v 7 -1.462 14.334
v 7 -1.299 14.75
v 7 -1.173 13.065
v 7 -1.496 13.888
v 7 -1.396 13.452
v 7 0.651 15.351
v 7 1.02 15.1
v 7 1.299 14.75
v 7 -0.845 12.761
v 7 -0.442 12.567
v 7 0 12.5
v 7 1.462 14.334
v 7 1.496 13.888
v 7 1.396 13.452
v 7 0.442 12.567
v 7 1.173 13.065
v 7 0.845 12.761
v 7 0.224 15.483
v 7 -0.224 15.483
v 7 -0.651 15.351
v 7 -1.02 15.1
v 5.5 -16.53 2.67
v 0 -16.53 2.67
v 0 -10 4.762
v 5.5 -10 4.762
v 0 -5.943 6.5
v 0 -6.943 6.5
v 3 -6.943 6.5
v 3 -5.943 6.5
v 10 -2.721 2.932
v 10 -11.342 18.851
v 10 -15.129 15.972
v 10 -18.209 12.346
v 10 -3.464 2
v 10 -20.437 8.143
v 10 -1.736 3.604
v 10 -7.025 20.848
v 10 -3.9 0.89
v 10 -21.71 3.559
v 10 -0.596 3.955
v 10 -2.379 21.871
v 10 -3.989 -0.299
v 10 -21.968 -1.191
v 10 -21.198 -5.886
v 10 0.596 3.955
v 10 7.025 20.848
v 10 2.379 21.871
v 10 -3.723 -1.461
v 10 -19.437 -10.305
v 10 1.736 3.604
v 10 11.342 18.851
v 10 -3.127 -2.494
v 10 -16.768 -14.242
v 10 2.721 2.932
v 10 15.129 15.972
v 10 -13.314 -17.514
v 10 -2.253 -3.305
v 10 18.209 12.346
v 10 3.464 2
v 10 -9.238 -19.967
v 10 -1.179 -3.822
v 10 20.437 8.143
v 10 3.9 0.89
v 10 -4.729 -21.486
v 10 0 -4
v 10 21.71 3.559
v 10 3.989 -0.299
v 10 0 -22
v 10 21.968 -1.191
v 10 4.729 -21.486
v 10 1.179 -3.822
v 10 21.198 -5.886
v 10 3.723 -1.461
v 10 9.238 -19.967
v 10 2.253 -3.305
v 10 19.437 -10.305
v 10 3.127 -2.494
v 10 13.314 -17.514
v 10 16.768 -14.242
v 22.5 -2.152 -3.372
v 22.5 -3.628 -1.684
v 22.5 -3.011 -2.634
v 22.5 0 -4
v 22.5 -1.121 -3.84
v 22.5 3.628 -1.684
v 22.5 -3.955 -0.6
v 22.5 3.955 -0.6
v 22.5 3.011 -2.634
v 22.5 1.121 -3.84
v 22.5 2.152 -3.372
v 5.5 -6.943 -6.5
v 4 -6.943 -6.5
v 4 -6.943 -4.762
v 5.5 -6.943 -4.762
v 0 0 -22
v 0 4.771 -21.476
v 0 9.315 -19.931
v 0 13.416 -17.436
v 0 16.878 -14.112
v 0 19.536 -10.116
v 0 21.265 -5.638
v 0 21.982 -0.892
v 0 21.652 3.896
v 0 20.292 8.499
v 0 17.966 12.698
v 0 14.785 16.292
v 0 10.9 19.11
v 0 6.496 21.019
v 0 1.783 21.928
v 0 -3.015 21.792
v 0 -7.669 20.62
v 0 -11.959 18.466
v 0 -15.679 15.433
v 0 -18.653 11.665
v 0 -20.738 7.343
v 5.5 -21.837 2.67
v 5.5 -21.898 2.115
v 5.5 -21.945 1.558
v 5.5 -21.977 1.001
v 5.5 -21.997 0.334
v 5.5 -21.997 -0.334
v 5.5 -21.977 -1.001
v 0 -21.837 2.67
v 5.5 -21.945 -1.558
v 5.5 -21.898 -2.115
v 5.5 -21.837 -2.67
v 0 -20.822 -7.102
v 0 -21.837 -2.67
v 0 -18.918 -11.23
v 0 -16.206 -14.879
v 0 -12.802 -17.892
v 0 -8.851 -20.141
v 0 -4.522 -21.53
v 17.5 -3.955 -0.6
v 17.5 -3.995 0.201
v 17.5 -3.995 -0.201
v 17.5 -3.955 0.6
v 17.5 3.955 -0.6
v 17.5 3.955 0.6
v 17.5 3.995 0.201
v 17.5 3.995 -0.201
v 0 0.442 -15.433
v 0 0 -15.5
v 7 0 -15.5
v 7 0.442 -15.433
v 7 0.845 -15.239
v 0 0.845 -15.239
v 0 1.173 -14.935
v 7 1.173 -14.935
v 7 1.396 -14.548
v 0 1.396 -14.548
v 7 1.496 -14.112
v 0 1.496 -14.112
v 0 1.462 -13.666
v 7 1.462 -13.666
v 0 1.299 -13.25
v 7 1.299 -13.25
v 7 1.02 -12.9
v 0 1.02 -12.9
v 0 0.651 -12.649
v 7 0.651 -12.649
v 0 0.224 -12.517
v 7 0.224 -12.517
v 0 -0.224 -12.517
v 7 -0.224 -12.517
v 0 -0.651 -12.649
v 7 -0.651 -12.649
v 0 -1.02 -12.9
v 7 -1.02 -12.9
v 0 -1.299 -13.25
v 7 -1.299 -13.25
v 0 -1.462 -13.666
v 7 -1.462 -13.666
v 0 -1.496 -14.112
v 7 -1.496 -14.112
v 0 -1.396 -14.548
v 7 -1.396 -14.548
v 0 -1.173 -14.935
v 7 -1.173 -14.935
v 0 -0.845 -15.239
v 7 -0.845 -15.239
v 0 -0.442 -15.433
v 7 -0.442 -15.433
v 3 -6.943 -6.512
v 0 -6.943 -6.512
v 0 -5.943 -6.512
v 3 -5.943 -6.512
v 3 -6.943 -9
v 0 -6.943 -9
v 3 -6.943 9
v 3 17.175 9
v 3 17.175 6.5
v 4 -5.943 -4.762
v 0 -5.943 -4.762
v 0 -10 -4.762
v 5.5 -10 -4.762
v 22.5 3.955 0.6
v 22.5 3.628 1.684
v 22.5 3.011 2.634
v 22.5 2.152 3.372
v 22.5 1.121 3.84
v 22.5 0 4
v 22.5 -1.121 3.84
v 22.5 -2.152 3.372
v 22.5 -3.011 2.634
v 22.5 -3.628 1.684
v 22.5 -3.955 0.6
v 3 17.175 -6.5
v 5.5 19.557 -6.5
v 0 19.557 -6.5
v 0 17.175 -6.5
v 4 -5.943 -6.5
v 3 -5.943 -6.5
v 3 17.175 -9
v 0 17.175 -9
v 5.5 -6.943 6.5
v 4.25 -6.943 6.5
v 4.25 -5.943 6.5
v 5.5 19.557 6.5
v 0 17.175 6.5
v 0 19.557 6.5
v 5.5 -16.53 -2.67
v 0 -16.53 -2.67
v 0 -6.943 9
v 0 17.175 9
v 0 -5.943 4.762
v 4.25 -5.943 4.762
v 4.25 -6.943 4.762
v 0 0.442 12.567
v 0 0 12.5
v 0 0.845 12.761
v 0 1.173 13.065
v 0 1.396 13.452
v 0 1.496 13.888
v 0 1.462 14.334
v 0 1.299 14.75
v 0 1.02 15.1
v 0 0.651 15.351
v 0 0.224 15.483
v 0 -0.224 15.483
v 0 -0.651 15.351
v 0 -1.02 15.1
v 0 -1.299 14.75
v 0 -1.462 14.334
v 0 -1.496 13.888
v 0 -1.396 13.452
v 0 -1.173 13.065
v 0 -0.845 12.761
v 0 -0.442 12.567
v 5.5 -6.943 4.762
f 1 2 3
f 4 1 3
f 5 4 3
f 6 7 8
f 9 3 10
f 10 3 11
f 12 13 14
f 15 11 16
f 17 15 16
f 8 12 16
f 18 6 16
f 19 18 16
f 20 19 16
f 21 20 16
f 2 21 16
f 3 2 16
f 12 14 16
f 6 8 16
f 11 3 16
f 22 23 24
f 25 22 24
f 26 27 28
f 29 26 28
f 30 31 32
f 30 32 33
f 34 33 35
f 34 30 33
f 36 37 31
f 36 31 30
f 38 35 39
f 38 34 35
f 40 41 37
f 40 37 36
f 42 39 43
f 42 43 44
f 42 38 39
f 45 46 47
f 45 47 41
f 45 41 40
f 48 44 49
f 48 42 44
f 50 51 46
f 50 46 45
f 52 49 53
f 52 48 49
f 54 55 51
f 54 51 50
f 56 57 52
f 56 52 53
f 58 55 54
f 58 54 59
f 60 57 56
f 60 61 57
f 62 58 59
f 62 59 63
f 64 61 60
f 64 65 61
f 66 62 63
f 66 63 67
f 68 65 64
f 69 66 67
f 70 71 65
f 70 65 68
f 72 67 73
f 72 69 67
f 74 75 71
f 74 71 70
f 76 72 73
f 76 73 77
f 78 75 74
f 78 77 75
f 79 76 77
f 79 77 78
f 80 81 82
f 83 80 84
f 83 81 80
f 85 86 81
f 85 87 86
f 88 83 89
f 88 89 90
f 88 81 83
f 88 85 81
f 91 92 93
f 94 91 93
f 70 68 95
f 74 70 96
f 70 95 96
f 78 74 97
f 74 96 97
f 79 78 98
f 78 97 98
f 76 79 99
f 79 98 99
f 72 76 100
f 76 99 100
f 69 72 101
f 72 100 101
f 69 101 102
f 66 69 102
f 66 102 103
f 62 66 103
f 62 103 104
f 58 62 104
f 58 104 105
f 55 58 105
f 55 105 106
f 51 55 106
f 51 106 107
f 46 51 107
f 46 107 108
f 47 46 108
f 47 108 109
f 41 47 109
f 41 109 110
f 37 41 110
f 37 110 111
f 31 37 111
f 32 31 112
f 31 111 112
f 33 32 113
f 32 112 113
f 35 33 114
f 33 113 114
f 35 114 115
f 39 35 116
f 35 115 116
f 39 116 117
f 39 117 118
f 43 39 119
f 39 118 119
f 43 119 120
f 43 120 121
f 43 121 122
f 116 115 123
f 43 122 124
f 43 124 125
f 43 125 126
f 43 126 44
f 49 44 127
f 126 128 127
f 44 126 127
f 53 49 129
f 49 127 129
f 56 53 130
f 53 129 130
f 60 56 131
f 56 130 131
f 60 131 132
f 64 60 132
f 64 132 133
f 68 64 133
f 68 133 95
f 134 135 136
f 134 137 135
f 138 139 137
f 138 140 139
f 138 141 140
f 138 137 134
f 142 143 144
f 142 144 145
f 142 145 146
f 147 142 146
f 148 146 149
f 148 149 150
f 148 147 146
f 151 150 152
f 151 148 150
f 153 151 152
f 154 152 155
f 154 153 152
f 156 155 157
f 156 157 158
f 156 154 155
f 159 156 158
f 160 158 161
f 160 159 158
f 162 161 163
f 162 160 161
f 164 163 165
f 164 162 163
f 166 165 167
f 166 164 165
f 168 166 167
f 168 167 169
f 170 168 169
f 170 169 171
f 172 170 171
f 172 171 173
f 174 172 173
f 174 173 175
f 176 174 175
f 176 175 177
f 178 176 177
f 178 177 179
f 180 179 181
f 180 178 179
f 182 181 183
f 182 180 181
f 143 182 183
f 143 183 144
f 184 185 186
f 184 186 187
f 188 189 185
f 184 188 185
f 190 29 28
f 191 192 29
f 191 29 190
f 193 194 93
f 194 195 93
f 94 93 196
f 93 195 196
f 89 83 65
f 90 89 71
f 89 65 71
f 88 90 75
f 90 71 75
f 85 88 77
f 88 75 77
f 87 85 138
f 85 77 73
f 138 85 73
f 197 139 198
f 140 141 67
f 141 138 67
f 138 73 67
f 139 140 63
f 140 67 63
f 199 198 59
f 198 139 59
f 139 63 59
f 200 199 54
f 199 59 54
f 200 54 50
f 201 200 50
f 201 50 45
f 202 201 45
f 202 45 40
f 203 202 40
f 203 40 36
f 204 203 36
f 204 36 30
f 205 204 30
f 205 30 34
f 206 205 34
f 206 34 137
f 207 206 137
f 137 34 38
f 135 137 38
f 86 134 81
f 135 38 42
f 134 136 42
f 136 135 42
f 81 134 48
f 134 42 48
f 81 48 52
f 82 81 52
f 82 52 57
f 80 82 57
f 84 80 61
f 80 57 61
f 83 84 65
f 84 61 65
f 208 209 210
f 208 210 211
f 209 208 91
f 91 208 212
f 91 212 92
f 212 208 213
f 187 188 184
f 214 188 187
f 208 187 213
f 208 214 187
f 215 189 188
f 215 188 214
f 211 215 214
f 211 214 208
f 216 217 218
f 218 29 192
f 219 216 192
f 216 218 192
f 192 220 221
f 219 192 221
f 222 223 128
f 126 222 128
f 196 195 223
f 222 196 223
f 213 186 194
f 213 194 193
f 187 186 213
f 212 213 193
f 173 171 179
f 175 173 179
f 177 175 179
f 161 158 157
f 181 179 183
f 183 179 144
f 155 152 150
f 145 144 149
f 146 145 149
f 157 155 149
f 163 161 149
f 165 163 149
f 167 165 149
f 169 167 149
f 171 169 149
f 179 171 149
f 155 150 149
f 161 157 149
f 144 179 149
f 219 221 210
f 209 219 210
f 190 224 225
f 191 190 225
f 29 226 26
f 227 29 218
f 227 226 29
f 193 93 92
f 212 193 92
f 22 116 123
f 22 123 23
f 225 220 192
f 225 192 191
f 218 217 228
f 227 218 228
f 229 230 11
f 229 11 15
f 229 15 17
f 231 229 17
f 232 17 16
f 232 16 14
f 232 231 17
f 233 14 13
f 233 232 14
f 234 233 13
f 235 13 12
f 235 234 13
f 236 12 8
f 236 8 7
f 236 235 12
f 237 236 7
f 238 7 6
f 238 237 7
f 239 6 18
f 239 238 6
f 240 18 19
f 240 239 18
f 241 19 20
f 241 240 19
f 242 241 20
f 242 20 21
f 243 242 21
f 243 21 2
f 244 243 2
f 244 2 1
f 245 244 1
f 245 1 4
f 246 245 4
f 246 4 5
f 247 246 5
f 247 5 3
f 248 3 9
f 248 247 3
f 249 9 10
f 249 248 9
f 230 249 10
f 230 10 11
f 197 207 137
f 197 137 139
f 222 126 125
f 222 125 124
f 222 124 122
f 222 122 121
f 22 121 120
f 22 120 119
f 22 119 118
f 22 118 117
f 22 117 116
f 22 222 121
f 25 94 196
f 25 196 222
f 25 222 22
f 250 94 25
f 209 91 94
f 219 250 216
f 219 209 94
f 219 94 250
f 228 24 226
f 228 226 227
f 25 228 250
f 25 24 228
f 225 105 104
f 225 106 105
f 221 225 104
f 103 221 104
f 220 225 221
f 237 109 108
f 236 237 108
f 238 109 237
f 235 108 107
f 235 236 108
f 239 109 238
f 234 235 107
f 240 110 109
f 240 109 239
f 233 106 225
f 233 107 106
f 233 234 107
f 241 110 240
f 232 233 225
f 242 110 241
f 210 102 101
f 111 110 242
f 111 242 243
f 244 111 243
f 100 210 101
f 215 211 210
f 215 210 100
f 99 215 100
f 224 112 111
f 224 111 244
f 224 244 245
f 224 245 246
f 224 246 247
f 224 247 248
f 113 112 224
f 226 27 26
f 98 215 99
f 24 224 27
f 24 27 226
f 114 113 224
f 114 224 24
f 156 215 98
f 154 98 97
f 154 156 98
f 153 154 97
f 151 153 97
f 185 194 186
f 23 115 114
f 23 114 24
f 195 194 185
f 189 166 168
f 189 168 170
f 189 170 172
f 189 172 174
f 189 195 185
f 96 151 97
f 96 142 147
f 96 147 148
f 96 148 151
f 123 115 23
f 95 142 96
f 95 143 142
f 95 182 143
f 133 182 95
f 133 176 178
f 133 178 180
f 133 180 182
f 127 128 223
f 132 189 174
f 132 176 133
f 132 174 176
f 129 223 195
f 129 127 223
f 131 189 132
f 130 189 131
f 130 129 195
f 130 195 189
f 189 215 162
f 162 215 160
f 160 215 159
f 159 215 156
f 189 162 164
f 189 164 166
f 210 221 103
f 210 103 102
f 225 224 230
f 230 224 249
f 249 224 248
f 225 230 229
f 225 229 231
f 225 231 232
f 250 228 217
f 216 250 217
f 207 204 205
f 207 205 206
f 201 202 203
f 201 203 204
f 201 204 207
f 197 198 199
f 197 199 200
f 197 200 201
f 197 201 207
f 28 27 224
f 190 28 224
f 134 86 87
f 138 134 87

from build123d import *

# Parameters (mm, degrees)
SKETCH1_R           = 22
BOSS_EXTRUDE1_DEPTH = 10
CUT_EXTRUDE2_DEPTH  = 5.5
SKETCH15_W          = 18
SKETCH15_H          = 24.118038922
CUT_EXTRUDE3_DEPTH  = 3
SKETCH16_R          = 4
BOSS_EXTRUDE2_DEPTH = 12.5
CUT_EXTRUDE4_START  = 22.5
SKETCH8_W           = 1.2
SKETCH8_H           = 10
CUT_EXTRUDE4_DEPTH  = 5
SKETCH17_W          = 4
SKETCH17_H          = 1.75
BOSS_EXTRUDE3_DEPTH = 1
SKETCH18_W          = 4.25
SKETCH18_H          = 1.737607108
BOSS_EXTRUDE4_DEPTH = 1
SKETCH22_R          = 1.5
CUT_EXTRUDE7_DEPTH  = 7


with BuildPart() as part:
    # Sketch1 → Boss-Extrude1 (new body)
    with BuildSketch(Plane(origin=(0, 0, 0), x_dir=(0, 0, -1), z_dir=(1, 0, 0))):
        Circle(SKETCH1_R)
    extrude(amount=BOSS_EXTRUDE1_DEPTH)

    # Sketch13 → Cut-Extrude2 (cut)
    with BuildSketch(Plane(origin=(0, 0, 0), x_dir=(0, 0, -1), z_dir=(1, 0, 0))):
        with BuildLine():
            Line((-2.670420152, -16.85816067), (-2.670420152, -16.530371213))
            Line((-2.670420152, -16.530371213), (-4.762392892, -10))
            Line((-4.762392892, -10), (-4.762392892, -6.943148259))
            Line((-4.762392892, -6.943148259), (-6.5, -6.943148259))
            Line((-6.5, -6.943148259), (-6.5, 19.556851741))
            Line((-6.5, 19.556851741), (6.5, 19.556851741))
            Line((6.5, 19.556851741), (6.5, -6.943148259))
            Line((6.5, -6.943148259), (4.762392892, -6.943148259))
            Line((4.762392892, -6.943148259), (4.762392892, -10))
            Line((4.762392892, -10), (2.670420152, -16.530371213))
            Line((2.670420152, -16.530371213), (2.670420152, -16.85816067))
            Line((2.670420152, -16.85816067), (2.670420152, -21.837327131))
            ThreePointArc((2.670420152, -21.837327131), (1.836835043, -21.92318492), (1.000584871, -21.977234355))
            Line((1.000584871, -21.977234355), (0, -25.25))
            Line((0, -25.25), (-1.000584871, -21.977234355))
            ThreePointArc((-1.000584871, -21.977234355), (-1.836835043, -21.92318492), (-2.670420152, -21.837327131))
            Line((-2.670420152, -21.837327131), (-2.670420152, -16.85816067))
        make_face()
    extrude(amount=CUT_EXTRUDE2_DEPTH, mode=Mode.SUBTRACT)

    # Sketch15 → Cut-Extrude3 (cut)
    with BuildSketch(Plane.ZY):
        with Locations((0, 5.115871202)):
            Rectangle(SKETCH15_W, SKETCH15_H)
    extrude(amount=-CUT_EXTRUDE3_DEPTH, mode=Mode.SUBTRACT)

    # Sketch16 → Boss-Extrude2 (add)
    with BuildSketch(Plane(origin=(10, 0, 0), x_dir=(0, 0, -1), z_dir=(1, 0, 0))):
        Circle(SKETCH16_R)
    extrude(amount=BOSS_EXTRUDE2_DEPTH)

    # Sketch8 → Cut-Extrude4 (cut)
    with BuildSketch(Plane(origin=(0, 0, 0), x_dir=(0, 0, -1), z_dir=(1, 0, 0)).offset(CUT_EXTRUDE4_START)):
        Rectangle(SKETCH8_W, SKETCH8_H)
    extrude(amount=-CUT_EXTRUDE4_DEPTH, mode=Mode.SUBTRACT)

    # Sketch17 → Boss-Extrude3 (add)
    with BuildSketch(Plane(origin=(0, -6.943148259, 0), x_dir=(1, 0, 0), z_dir=(0, 1, 0))):
        with Locations((2, 5.637392892)):
            Rectangle(SKETCH17_W, SKETCH17_H)
    extrude(amount=BOSS_EXTRUDE3_DEPTH)

    # Sketch18 → Boss-Extrude4 (add)
    with BuildSketch(Plane(origin=(0, -6.943148259, 0), x_dir=(1, 0, 0), z_dir=(0, 1, 0))):
        with Locations((2.125, -5.631196446)):
            Rectangle(SKETCH18_W, SKETCH18_H)
    extrude(amount=BOSS_EXTRUDE4_DEPTH)

    # Sketch22 → Cut-Extrude7 (cut)
    with BuildSketch(Plane(origin=(0, 0, 0), x_dir=(0, 0, -1), z_dir=(1, 0, 0))):
        with Locations((-14, 0)):
            Circle(SKETCH22_R)
        with Locations((14, 0)):
            Circle(SKETCH22_R)
    extrude(amount=CUT_EXTRUDE7_DEPTH, mode=Mode.SUBTRACT)


solid = part.part
